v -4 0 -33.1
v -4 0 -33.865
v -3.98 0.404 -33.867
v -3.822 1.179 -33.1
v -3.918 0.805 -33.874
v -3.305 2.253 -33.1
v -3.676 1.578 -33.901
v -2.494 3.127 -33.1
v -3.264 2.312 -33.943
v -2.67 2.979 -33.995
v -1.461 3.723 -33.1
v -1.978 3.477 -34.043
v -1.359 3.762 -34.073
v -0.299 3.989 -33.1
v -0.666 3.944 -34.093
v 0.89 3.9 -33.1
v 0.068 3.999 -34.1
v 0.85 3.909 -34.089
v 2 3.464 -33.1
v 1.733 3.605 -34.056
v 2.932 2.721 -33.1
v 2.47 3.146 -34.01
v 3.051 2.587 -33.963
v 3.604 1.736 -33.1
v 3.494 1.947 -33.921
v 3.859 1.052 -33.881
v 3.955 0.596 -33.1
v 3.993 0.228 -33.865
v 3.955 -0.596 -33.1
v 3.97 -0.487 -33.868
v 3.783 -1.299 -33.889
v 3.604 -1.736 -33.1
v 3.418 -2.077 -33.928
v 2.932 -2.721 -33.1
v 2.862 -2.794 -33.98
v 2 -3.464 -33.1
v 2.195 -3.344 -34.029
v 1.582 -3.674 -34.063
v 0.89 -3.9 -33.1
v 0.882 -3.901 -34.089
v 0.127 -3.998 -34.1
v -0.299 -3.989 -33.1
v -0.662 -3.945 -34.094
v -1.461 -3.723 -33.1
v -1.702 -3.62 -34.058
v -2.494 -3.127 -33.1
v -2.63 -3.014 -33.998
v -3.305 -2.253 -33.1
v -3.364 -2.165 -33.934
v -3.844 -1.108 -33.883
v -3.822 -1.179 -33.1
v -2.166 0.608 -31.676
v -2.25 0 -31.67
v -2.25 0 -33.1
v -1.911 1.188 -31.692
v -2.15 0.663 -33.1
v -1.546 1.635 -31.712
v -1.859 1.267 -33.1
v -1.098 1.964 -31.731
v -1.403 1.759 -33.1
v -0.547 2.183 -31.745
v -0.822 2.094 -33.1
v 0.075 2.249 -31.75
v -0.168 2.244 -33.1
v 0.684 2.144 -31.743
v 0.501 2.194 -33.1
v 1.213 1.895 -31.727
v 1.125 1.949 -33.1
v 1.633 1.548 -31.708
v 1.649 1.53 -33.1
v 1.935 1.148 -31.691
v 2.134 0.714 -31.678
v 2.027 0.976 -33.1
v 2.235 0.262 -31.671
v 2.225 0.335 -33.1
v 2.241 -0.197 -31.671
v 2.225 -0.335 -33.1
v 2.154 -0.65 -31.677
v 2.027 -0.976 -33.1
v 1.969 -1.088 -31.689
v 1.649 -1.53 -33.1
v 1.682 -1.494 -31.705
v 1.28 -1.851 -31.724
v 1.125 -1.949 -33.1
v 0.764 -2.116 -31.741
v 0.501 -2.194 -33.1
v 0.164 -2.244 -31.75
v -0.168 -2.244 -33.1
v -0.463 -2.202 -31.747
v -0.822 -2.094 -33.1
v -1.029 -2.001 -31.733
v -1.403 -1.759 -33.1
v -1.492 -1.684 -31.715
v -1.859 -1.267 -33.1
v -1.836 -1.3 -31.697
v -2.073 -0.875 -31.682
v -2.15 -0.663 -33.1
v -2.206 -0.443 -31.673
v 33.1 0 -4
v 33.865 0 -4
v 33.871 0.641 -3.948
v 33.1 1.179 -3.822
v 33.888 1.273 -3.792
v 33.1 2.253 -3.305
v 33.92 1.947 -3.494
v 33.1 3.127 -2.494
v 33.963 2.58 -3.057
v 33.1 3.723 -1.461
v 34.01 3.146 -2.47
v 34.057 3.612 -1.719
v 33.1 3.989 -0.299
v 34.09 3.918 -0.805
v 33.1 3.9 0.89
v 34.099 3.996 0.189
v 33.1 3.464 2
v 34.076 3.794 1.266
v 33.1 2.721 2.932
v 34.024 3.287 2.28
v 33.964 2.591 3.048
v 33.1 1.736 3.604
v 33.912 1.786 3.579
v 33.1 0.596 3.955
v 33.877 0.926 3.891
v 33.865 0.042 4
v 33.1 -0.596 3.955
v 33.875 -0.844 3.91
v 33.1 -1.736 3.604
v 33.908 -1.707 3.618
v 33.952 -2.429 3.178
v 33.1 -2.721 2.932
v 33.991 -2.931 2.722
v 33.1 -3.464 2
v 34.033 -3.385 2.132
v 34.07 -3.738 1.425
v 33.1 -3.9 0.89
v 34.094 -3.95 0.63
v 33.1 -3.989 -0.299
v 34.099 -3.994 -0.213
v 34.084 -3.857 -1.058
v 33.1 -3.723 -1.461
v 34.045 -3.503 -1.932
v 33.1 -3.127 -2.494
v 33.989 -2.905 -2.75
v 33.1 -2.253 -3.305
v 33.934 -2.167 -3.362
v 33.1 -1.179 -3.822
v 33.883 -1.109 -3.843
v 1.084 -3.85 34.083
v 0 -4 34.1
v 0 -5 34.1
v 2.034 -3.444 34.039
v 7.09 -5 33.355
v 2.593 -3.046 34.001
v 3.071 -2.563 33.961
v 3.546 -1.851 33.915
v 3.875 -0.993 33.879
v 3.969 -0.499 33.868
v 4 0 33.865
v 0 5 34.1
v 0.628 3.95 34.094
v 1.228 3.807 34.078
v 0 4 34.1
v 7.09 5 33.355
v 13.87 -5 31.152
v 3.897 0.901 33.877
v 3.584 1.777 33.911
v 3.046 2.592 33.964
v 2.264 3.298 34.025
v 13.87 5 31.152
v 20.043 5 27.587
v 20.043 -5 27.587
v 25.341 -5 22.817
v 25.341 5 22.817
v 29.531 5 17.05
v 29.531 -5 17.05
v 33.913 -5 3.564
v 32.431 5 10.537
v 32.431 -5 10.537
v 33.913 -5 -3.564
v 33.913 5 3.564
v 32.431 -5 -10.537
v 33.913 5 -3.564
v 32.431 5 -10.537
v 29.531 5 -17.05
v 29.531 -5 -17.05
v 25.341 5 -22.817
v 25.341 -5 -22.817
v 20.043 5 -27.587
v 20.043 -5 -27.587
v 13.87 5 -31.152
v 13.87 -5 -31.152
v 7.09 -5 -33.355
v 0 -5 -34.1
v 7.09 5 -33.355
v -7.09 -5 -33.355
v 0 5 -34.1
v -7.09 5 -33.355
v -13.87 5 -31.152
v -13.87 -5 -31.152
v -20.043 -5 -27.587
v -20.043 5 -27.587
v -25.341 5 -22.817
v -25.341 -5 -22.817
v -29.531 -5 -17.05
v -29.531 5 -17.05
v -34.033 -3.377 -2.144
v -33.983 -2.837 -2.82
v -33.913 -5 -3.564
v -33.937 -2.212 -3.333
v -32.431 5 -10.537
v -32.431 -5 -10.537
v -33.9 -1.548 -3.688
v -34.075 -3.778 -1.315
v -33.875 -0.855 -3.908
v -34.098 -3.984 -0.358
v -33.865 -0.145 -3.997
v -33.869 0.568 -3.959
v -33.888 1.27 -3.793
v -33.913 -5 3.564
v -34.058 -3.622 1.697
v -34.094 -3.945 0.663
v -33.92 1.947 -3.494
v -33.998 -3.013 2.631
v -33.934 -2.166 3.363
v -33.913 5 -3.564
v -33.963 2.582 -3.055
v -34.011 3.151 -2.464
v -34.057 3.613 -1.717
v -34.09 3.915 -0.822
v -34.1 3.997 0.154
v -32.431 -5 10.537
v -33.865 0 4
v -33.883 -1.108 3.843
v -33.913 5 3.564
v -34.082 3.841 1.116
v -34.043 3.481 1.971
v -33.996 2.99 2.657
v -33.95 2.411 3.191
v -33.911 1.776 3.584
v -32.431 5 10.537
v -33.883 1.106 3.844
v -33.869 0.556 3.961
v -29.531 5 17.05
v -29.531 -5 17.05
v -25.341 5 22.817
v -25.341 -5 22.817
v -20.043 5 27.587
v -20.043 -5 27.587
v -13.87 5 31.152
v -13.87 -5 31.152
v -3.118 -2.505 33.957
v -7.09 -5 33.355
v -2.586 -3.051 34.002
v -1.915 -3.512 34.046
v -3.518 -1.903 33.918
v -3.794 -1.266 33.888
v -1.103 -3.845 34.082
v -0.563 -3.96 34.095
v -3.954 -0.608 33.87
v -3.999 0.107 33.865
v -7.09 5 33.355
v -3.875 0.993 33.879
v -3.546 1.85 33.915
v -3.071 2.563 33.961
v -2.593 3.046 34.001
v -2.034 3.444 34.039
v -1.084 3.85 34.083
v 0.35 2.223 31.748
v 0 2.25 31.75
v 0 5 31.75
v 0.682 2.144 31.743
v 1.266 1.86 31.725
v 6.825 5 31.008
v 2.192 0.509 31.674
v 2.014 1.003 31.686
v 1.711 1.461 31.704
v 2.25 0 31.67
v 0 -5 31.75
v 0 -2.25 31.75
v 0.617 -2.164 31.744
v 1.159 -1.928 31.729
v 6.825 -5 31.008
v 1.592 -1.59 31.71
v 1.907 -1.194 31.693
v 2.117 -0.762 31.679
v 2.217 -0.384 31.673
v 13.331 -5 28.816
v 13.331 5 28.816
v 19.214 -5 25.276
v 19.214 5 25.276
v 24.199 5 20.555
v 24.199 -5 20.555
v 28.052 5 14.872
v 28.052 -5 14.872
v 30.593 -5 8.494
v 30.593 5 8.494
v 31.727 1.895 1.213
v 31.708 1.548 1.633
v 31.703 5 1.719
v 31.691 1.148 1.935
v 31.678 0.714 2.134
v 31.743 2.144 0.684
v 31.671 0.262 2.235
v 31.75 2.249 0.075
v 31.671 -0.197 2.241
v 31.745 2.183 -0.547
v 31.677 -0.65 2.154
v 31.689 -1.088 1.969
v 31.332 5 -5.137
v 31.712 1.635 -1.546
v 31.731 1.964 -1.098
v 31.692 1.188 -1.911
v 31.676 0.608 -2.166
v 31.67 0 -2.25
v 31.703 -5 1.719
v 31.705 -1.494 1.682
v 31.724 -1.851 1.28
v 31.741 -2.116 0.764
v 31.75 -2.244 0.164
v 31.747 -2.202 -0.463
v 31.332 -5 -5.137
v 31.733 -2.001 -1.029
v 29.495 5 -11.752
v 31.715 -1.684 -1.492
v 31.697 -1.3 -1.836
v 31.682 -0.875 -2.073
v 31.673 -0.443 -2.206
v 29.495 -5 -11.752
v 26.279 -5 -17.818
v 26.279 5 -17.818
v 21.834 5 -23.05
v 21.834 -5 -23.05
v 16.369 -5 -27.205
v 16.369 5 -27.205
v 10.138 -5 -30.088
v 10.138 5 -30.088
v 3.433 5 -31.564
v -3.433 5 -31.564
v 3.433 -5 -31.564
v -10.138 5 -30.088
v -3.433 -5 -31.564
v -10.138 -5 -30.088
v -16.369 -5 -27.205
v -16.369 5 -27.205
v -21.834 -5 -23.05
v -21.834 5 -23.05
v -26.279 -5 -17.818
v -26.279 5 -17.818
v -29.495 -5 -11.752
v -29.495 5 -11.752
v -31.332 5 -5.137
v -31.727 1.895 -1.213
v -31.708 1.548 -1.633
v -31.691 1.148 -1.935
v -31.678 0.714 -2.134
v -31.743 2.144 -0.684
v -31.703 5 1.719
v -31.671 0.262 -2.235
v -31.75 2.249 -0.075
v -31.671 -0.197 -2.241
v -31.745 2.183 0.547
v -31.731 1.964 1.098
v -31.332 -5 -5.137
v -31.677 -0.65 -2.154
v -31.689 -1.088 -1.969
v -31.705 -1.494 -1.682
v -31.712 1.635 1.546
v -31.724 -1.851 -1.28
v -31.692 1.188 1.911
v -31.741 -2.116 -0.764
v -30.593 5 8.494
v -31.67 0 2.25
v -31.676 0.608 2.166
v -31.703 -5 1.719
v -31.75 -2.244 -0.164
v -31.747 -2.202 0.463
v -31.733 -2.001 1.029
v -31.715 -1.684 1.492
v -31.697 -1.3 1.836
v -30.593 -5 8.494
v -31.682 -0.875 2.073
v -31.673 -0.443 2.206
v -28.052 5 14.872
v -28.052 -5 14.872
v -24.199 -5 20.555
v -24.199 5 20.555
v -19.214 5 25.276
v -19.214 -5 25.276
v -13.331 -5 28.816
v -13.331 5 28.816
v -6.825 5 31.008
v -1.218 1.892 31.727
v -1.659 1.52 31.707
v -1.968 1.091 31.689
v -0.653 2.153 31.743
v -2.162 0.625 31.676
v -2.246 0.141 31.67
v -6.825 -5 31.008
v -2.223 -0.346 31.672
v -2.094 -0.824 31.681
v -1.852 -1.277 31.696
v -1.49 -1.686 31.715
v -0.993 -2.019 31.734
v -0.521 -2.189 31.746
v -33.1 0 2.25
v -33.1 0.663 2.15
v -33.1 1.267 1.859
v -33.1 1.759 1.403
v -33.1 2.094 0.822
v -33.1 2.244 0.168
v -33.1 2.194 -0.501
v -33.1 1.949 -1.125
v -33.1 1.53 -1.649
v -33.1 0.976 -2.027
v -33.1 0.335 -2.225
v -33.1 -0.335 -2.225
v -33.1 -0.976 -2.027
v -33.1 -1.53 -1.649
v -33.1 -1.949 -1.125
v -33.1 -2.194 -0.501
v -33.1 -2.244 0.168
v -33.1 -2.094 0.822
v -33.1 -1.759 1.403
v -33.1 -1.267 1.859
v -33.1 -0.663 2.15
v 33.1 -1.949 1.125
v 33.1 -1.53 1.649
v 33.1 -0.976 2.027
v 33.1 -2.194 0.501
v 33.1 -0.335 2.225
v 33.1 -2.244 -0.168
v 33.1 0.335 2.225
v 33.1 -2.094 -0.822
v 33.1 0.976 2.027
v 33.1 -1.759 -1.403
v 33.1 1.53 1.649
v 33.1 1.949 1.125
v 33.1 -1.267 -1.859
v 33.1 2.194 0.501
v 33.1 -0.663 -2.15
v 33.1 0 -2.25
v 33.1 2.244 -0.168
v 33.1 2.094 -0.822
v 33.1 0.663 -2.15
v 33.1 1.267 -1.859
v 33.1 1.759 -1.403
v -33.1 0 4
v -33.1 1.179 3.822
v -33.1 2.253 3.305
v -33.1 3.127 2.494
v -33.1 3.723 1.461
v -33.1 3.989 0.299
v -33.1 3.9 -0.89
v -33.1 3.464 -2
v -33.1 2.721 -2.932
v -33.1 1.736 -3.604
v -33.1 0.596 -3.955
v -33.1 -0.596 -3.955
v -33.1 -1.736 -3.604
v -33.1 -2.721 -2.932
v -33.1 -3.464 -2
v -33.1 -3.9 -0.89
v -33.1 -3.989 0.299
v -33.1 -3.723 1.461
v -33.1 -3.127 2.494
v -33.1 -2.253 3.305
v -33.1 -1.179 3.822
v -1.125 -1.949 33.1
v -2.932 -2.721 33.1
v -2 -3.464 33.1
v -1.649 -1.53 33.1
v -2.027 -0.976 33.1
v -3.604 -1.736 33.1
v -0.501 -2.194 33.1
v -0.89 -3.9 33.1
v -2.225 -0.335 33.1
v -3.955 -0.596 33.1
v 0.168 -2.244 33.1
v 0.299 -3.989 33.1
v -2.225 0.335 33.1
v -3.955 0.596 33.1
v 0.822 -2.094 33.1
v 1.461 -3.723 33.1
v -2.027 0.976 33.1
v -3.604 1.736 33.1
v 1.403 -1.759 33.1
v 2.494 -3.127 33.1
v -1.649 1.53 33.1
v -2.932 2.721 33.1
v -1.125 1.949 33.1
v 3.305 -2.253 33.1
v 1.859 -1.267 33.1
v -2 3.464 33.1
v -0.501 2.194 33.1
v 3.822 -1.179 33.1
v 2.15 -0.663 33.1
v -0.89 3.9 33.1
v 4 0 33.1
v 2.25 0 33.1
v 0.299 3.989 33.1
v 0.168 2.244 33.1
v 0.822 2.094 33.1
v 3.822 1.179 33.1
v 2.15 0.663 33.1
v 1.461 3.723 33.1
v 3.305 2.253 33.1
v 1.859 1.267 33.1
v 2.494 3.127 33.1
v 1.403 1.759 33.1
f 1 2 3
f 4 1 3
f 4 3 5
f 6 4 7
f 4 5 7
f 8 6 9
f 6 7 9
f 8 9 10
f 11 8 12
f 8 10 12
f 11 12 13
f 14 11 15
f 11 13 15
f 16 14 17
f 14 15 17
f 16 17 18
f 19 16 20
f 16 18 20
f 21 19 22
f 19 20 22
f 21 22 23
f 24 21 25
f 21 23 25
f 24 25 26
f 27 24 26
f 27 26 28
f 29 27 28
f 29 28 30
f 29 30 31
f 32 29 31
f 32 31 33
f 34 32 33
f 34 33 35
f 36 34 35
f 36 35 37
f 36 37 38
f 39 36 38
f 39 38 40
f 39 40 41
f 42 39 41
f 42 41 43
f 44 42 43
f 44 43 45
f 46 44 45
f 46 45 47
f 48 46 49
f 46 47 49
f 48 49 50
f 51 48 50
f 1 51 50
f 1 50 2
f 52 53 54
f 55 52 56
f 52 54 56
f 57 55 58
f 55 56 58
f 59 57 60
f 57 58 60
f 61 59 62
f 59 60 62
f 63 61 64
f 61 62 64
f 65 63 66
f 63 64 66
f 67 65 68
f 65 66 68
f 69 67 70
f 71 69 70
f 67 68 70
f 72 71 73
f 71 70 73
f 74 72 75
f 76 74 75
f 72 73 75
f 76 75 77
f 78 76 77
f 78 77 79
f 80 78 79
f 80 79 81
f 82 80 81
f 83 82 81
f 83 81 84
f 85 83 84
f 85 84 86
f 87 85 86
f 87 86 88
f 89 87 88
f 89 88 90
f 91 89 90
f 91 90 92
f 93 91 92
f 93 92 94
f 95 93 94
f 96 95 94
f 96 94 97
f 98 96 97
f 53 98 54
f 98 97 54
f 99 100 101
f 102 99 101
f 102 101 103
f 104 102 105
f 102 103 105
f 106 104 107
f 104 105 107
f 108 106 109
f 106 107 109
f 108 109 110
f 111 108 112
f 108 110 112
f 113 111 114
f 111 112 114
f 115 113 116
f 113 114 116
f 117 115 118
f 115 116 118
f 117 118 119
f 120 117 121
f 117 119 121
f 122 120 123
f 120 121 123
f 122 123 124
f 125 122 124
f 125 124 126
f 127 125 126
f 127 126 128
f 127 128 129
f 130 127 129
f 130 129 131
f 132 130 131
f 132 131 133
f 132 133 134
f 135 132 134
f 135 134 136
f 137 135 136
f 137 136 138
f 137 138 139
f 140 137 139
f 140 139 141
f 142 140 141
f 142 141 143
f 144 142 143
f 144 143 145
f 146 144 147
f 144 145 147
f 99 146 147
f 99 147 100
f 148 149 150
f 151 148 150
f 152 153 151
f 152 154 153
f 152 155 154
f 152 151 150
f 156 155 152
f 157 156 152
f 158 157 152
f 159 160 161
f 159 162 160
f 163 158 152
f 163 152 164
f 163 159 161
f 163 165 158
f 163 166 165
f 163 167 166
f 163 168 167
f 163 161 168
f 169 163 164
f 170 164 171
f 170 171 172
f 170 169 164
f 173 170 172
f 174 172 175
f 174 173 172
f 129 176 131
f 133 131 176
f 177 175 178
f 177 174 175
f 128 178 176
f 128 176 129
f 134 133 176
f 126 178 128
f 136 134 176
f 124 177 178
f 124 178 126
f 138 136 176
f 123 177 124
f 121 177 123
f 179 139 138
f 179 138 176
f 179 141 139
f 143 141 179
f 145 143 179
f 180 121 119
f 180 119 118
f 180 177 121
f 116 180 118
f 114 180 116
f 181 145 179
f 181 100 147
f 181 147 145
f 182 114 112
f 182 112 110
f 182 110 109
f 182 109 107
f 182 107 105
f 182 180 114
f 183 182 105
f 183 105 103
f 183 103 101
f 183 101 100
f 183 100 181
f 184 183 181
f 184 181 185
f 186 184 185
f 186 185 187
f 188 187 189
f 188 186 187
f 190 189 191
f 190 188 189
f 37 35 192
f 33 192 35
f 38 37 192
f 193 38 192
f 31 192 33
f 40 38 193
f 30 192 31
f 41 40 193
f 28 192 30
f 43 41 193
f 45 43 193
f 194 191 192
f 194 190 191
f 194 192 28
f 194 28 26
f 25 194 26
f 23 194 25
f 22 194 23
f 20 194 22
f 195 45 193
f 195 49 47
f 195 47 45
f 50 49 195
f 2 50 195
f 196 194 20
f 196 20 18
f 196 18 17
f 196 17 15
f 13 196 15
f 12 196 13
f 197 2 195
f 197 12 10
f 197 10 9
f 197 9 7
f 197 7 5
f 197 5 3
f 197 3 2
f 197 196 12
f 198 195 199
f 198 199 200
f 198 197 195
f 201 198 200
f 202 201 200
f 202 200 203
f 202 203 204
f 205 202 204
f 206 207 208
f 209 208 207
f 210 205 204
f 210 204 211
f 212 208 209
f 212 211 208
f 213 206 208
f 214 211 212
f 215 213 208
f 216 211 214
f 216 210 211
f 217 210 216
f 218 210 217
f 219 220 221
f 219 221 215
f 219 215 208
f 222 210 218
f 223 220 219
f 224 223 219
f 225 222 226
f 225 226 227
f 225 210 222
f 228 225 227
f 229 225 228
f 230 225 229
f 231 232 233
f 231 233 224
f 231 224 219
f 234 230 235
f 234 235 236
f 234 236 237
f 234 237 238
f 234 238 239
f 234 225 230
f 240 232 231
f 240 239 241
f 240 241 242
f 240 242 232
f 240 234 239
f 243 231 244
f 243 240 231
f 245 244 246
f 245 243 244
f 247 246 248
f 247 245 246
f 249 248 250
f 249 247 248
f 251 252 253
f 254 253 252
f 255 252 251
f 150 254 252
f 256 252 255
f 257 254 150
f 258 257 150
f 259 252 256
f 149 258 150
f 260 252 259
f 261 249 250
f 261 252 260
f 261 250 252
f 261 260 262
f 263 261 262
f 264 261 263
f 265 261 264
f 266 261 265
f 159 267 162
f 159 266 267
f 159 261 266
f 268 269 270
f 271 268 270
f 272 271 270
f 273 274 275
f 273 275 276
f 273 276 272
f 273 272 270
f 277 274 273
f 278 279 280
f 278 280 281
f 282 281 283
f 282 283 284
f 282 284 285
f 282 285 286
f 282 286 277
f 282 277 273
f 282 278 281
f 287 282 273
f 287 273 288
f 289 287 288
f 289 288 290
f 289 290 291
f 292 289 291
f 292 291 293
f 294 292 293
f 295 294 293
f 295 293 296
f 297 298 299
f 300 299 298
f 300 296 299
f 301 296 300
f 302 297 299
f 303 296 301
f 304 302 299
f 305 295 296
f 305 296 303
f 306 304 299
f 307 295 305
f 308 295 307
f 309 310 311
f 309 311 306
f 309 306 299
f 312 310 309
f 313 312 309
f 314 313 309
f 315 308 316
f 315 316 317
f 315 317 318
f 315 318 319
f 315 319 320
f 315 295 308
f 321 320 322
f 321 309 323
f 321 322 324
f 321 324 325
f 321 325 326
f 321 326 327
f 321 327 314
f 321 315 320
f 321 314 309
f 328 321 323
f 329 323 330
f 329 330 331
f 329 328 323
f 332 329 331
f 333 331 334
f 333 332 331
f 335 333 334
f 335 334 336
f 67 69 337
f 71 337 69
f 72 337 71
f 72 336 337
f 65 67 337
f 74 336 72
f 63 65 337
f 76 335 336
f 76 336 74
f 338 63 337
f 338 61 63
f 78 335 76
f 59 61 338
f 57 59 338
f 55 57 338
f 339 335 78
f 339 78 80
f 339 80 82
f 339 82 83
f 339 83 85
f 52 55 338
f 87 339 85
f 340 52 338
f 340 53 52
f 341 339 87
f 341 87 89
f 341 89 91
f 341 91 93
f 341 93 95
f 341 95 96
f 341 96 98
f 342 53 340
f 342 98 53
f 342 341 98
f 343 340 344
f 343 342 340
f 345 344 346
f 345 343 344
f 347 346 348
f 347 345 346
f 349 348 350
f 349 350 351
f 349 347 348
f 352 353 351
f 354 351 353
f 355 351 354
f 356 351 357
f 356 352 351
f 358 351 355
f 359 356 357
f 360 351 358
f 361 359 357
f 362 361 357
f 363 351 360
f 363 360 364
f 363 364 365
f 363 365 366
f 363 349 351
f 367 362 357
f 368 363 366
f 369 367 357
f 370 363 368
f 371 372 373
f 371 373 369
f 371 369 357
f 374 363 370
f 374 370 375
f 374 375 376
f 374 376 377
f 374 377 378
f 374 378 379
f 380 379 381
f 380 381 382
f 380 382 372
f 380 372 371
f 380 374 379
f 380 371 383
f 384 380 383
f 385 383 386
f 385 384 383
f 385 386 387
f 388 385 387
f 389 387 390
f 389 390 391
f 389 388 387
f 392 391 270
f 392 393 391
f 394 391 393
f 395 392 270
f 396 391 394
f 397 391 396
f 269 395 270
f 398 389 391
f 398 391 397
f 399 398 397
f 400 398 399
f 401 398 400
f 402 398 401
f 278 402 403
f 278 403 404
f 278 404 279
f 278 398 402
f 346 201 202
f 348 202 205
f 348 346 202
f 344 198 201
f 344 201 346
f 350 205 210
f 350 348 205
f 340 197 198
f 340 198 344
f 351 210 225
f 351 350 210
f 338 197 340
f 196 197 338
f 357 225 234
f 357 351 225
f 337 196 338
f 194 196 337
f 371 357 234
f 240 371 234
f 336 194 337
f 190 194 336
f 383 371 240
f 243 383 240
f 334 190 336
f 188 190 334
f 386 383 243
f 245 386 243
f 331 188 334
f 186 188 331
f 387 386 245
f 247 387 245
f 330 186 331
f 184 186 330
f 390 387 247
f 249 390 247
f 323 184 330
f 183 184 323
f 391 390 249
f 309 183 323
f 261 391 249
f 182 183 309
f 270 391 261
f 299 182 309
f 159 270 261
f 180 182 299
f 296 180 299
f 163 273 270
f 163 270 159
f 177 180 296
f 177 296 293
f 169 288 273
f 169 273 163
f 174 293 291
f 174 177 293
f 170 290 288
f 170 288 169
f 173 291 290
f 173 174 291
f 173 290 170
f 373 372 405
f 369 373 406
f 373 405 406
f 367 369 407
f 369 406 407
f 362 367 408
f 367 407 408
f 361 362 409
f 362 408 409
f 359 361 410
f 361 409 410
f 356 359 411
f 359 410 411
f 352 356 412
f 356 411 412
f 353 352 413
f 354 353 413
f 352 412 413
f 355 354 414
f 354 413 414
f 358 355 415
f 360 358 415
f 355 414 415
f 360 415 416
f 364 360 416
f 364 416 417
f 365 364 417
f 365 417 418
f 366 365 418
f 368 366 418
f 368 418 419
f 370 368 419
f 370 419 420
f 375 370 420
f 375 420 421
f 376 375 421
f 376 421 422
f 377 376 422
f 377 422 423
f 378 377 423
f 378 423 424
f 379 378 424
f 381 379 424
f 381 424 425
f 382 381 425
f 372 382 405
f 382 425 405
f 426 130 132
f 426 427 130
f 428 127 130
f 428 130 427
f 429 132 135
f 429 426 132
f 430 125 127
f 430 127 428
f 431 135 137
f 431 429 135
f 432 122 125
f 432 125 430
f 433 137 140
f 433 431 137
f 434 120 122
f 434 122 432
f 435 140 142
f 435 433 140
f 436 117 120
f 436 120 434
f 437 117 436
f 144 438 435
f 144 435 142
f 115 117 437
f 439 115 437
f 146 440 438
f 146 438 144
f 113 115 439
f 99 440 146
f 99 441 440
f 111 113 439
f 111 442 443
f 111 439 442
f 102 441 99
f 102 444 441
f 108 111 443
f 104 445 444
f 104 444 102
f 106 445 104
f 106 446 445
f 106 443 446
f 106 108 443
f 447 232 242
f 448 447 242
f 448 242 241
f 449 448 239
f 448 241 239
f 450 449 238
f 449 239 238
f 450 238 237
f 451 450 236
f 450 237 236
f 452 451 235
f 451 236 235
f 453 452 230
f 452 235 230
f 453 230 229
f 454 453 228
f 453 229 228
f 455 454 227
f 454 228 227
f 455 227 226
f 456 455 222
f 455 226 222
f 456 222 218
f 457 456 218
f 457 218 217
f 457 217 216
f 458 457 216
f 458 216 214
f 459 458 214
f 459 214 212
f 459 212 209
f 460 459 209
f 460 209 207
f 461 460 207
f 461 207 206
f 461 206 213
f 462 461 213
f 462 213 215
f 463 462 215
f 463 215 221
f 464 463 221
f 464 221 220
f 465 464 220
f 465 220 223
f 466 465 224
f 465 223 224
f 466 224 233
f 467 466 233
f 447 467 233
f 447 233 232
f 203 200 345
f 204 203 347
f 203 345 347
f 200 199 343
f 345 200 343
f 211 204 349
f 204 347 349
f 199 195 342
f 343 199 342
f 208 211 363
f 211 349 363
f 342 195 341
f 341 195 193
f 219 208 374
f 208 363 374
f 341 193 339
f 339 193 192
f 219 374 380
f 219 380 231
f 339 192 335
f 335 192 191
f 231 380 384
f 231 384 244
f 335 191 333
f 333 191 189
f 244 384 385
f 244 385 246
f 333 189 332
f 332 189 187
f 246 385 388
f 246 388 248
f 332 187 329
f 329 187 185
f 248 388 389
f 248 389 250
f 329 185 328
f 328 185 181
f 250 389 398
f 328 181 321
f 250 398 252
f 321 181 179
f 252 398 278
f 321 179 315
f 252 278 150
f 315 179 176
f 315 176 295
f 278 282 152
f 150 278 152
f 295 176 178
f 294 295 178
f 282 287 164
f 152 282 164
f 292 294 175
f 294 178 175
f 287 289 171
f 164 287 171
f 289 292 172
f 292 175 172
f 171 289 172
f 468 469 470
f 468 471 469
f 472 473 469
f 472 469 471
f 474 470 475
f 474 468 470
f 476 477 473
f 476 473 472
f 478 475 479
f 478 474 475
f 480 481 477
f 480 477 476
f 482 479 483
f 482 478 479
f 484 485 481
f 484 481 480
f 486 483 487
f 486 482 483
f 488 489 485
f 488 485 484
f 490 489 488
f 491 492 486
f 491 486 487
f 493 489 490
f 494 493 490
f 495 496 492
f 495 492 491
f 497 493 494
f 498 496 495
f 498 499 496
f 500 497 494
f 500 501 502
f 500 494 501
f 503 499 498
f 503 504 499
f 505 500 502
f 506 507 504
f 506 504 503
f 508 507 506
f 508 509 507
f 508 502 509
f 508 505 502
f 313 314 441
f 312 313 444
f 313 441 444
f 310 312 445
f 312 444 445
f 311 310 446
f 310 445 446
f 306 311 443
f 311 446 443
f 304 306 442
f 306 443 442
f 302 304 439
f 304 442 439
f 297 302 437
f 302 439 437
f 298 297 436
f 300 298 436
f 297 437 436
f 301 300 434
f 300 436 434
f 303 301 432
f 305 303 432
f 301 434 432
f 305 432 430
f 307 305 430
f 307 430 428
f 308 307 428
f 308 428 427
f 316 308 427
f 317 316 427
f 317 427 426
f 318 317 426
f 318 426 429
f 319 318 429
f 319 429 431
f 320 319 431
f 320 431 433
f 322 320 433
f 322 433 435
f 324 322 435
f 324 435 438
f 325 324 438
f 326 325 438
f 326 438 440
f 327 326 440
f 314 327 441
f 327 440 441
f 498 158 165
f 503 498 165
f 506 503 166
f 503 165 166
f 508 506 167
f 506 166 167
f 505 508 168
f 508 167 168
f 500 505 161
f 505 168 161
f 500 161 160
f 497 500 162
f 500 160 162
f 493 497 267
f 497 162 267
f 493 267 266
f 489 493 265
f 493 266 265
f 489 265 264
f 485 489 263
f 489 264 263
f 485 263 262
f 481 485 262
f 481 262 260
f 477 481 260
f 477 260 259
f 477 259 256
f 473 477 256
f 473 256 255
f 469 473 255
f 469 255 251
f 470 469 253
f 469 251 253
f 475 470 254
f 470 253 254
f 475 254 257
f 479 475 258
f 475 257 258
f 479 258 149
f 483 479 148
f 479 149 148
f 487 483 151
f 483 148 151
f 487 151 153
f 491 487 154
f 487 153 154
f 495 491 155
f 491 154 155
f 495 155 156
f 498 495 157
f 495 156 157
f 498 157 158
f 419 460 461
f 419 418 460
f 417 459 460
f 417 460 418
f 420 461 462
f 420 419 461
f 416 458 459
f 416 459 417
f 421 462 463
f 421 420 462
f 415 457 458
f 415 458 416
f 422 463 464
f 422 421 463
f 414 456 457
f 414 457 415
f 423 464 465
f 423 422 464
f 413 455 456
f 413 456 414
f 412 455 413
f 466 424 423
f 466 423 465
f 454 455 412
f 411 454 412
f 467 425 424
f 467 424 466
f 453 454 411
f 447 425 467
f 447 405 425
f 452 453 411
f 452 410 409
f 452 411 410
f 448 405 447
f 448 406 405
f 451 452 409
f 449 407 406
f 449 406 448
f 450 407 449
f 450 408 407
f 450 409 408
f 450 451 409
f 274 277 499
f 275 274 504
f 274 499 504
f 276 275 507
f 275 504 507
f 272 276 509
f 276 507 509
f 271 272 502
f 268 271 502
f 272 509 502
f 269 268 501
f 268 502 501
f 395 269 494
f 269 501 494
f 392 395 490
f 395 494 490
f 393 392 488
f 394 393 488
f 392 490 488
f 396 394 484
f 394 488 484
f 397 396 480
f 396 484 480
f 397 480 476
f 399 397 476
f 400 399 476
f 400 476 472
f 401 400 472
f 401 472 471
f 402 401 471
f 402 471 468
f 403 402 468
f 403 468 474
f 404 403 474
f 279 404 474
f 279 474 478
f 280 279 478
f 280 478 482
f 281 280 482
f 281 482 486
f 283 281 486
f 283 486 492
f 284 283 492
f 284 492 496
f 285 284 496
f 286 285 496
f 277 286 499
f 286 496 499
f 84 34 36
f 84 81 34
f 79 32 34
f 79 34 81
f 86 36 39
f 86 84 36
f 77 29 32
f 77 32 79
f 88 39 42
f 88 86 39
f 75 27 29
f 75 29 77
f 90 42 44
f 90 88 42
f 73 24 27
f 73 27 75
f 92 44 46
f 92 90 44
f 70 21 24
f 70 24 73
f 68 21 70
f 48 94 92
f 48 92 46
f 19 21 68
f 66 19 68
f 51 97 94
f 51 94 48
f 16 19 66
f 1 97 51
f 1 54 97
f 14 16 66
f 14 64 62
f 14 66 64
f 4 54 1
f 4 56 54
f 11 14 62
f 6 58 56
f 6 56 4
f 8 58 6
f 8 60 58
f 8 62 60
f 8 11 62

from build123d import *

# Parameters (mm, degrees)
SKETCH1_R               = 34.1
SKETCH1_R_2             = 31.75
BOSS_EXTRUDE1_DEPTH     = 5
SKETCH2_R               = 4
CUT_EXTRUDE1_DEPTH      = 1
CUT_EXTRUDE2_REACH      = 77.523
CUT_EXTRUDE2_END_RADIUS = 31.75
SKETCH3_R               = 2.25
CIRPATTERN1_COUNT       = 4


with BuildPart() as part:
    # Sketch1 → Boss-Extrude1 (new, symmetric)
    with BuildSketch(Plane(origin=(0, 0, 0), x_dir=(1, 0, 0), z_dir=(0, 1, 0))):
        with Locations(Location((0, 0, 0), (0, 0, 270))):
            Circle(SKETCH1_R)
        with Locations(Location((0, 0, 0), (0, 0, 270))):
            Circle(SKETCH1_R_2, mode=Mode.SUBTRACT)
    extrude(amount=BOSS_EXTRUDE1_DEPTH, both=True)

    # Sketch2 → Cut-Extrude1 (cut)
    with BuildSketch(Plane(origin=(0, 0, -34.1), x_dir=(-1, 0, 0), z_dir=(0, 0, -1))):
        Circle(SKETCH2_R)
    cut_extrude1 = extrude(amount=-CUT_EXTRUDE1_DEPTH, mode=Mode.SUBTRACT)

    # Cut-Extrude2: up to this cylinder (the profile starts outside it)
    cut_extrude2_end = Plane(origin=(0, 0, 0), z_dir=(0, -1, 0)) * Cylinder(CUT_EXTRUDE2_END_RADIUS, 219.546, mode=Mode.PRIVATE)
    # Sketch3 → Cut-Extrude2 (cut, up to the surface)
    with BuildSketch(Plane(origin=(0, 0, -33.1), x_dir=(-1, 0, 0), z_dir=(0, 0, -1)), mode=Mode.PRIVATE) as cut_extrude2_sk1:
        Circle(SKETCH3_R)
    cut_extrude2_tool1 = extrude(cut_extrude2_sk1.sketch, amount=-CUT_EXTRUDE2_REACH, mode=Mode.PRIVATE) - cut_extrude2_end
    cut_extrude2 = cut_extrude2_tool1.solids().sort_by_distance((0, 0, -33.1))[0]
    add(cut_extrude2, mode=Mode.SUBTRACT)

    # CirPattern1: Cut-Extrude1, Cut-Extrude2 ×4 about axis
    cirpattern1_axis = Axis((0, 0, 0), (0, 1, 0))
    add([cut_extrude1.rotate(cirpattern1_axis, i * 360 / CIRPATTERN1_COUNT) for i in range(1, CIRPATTERN1_COUNT)], mode=Mode.SUBTRACT)
    add([cut_extrude2.rotate(cirpattern1_axis, i * 360 / CIRPATTERN1_COUNT) for i in range(1, CIRPATTERN1_COUNT)], mode=Mode.SUBTRACT)


solid = part.part
